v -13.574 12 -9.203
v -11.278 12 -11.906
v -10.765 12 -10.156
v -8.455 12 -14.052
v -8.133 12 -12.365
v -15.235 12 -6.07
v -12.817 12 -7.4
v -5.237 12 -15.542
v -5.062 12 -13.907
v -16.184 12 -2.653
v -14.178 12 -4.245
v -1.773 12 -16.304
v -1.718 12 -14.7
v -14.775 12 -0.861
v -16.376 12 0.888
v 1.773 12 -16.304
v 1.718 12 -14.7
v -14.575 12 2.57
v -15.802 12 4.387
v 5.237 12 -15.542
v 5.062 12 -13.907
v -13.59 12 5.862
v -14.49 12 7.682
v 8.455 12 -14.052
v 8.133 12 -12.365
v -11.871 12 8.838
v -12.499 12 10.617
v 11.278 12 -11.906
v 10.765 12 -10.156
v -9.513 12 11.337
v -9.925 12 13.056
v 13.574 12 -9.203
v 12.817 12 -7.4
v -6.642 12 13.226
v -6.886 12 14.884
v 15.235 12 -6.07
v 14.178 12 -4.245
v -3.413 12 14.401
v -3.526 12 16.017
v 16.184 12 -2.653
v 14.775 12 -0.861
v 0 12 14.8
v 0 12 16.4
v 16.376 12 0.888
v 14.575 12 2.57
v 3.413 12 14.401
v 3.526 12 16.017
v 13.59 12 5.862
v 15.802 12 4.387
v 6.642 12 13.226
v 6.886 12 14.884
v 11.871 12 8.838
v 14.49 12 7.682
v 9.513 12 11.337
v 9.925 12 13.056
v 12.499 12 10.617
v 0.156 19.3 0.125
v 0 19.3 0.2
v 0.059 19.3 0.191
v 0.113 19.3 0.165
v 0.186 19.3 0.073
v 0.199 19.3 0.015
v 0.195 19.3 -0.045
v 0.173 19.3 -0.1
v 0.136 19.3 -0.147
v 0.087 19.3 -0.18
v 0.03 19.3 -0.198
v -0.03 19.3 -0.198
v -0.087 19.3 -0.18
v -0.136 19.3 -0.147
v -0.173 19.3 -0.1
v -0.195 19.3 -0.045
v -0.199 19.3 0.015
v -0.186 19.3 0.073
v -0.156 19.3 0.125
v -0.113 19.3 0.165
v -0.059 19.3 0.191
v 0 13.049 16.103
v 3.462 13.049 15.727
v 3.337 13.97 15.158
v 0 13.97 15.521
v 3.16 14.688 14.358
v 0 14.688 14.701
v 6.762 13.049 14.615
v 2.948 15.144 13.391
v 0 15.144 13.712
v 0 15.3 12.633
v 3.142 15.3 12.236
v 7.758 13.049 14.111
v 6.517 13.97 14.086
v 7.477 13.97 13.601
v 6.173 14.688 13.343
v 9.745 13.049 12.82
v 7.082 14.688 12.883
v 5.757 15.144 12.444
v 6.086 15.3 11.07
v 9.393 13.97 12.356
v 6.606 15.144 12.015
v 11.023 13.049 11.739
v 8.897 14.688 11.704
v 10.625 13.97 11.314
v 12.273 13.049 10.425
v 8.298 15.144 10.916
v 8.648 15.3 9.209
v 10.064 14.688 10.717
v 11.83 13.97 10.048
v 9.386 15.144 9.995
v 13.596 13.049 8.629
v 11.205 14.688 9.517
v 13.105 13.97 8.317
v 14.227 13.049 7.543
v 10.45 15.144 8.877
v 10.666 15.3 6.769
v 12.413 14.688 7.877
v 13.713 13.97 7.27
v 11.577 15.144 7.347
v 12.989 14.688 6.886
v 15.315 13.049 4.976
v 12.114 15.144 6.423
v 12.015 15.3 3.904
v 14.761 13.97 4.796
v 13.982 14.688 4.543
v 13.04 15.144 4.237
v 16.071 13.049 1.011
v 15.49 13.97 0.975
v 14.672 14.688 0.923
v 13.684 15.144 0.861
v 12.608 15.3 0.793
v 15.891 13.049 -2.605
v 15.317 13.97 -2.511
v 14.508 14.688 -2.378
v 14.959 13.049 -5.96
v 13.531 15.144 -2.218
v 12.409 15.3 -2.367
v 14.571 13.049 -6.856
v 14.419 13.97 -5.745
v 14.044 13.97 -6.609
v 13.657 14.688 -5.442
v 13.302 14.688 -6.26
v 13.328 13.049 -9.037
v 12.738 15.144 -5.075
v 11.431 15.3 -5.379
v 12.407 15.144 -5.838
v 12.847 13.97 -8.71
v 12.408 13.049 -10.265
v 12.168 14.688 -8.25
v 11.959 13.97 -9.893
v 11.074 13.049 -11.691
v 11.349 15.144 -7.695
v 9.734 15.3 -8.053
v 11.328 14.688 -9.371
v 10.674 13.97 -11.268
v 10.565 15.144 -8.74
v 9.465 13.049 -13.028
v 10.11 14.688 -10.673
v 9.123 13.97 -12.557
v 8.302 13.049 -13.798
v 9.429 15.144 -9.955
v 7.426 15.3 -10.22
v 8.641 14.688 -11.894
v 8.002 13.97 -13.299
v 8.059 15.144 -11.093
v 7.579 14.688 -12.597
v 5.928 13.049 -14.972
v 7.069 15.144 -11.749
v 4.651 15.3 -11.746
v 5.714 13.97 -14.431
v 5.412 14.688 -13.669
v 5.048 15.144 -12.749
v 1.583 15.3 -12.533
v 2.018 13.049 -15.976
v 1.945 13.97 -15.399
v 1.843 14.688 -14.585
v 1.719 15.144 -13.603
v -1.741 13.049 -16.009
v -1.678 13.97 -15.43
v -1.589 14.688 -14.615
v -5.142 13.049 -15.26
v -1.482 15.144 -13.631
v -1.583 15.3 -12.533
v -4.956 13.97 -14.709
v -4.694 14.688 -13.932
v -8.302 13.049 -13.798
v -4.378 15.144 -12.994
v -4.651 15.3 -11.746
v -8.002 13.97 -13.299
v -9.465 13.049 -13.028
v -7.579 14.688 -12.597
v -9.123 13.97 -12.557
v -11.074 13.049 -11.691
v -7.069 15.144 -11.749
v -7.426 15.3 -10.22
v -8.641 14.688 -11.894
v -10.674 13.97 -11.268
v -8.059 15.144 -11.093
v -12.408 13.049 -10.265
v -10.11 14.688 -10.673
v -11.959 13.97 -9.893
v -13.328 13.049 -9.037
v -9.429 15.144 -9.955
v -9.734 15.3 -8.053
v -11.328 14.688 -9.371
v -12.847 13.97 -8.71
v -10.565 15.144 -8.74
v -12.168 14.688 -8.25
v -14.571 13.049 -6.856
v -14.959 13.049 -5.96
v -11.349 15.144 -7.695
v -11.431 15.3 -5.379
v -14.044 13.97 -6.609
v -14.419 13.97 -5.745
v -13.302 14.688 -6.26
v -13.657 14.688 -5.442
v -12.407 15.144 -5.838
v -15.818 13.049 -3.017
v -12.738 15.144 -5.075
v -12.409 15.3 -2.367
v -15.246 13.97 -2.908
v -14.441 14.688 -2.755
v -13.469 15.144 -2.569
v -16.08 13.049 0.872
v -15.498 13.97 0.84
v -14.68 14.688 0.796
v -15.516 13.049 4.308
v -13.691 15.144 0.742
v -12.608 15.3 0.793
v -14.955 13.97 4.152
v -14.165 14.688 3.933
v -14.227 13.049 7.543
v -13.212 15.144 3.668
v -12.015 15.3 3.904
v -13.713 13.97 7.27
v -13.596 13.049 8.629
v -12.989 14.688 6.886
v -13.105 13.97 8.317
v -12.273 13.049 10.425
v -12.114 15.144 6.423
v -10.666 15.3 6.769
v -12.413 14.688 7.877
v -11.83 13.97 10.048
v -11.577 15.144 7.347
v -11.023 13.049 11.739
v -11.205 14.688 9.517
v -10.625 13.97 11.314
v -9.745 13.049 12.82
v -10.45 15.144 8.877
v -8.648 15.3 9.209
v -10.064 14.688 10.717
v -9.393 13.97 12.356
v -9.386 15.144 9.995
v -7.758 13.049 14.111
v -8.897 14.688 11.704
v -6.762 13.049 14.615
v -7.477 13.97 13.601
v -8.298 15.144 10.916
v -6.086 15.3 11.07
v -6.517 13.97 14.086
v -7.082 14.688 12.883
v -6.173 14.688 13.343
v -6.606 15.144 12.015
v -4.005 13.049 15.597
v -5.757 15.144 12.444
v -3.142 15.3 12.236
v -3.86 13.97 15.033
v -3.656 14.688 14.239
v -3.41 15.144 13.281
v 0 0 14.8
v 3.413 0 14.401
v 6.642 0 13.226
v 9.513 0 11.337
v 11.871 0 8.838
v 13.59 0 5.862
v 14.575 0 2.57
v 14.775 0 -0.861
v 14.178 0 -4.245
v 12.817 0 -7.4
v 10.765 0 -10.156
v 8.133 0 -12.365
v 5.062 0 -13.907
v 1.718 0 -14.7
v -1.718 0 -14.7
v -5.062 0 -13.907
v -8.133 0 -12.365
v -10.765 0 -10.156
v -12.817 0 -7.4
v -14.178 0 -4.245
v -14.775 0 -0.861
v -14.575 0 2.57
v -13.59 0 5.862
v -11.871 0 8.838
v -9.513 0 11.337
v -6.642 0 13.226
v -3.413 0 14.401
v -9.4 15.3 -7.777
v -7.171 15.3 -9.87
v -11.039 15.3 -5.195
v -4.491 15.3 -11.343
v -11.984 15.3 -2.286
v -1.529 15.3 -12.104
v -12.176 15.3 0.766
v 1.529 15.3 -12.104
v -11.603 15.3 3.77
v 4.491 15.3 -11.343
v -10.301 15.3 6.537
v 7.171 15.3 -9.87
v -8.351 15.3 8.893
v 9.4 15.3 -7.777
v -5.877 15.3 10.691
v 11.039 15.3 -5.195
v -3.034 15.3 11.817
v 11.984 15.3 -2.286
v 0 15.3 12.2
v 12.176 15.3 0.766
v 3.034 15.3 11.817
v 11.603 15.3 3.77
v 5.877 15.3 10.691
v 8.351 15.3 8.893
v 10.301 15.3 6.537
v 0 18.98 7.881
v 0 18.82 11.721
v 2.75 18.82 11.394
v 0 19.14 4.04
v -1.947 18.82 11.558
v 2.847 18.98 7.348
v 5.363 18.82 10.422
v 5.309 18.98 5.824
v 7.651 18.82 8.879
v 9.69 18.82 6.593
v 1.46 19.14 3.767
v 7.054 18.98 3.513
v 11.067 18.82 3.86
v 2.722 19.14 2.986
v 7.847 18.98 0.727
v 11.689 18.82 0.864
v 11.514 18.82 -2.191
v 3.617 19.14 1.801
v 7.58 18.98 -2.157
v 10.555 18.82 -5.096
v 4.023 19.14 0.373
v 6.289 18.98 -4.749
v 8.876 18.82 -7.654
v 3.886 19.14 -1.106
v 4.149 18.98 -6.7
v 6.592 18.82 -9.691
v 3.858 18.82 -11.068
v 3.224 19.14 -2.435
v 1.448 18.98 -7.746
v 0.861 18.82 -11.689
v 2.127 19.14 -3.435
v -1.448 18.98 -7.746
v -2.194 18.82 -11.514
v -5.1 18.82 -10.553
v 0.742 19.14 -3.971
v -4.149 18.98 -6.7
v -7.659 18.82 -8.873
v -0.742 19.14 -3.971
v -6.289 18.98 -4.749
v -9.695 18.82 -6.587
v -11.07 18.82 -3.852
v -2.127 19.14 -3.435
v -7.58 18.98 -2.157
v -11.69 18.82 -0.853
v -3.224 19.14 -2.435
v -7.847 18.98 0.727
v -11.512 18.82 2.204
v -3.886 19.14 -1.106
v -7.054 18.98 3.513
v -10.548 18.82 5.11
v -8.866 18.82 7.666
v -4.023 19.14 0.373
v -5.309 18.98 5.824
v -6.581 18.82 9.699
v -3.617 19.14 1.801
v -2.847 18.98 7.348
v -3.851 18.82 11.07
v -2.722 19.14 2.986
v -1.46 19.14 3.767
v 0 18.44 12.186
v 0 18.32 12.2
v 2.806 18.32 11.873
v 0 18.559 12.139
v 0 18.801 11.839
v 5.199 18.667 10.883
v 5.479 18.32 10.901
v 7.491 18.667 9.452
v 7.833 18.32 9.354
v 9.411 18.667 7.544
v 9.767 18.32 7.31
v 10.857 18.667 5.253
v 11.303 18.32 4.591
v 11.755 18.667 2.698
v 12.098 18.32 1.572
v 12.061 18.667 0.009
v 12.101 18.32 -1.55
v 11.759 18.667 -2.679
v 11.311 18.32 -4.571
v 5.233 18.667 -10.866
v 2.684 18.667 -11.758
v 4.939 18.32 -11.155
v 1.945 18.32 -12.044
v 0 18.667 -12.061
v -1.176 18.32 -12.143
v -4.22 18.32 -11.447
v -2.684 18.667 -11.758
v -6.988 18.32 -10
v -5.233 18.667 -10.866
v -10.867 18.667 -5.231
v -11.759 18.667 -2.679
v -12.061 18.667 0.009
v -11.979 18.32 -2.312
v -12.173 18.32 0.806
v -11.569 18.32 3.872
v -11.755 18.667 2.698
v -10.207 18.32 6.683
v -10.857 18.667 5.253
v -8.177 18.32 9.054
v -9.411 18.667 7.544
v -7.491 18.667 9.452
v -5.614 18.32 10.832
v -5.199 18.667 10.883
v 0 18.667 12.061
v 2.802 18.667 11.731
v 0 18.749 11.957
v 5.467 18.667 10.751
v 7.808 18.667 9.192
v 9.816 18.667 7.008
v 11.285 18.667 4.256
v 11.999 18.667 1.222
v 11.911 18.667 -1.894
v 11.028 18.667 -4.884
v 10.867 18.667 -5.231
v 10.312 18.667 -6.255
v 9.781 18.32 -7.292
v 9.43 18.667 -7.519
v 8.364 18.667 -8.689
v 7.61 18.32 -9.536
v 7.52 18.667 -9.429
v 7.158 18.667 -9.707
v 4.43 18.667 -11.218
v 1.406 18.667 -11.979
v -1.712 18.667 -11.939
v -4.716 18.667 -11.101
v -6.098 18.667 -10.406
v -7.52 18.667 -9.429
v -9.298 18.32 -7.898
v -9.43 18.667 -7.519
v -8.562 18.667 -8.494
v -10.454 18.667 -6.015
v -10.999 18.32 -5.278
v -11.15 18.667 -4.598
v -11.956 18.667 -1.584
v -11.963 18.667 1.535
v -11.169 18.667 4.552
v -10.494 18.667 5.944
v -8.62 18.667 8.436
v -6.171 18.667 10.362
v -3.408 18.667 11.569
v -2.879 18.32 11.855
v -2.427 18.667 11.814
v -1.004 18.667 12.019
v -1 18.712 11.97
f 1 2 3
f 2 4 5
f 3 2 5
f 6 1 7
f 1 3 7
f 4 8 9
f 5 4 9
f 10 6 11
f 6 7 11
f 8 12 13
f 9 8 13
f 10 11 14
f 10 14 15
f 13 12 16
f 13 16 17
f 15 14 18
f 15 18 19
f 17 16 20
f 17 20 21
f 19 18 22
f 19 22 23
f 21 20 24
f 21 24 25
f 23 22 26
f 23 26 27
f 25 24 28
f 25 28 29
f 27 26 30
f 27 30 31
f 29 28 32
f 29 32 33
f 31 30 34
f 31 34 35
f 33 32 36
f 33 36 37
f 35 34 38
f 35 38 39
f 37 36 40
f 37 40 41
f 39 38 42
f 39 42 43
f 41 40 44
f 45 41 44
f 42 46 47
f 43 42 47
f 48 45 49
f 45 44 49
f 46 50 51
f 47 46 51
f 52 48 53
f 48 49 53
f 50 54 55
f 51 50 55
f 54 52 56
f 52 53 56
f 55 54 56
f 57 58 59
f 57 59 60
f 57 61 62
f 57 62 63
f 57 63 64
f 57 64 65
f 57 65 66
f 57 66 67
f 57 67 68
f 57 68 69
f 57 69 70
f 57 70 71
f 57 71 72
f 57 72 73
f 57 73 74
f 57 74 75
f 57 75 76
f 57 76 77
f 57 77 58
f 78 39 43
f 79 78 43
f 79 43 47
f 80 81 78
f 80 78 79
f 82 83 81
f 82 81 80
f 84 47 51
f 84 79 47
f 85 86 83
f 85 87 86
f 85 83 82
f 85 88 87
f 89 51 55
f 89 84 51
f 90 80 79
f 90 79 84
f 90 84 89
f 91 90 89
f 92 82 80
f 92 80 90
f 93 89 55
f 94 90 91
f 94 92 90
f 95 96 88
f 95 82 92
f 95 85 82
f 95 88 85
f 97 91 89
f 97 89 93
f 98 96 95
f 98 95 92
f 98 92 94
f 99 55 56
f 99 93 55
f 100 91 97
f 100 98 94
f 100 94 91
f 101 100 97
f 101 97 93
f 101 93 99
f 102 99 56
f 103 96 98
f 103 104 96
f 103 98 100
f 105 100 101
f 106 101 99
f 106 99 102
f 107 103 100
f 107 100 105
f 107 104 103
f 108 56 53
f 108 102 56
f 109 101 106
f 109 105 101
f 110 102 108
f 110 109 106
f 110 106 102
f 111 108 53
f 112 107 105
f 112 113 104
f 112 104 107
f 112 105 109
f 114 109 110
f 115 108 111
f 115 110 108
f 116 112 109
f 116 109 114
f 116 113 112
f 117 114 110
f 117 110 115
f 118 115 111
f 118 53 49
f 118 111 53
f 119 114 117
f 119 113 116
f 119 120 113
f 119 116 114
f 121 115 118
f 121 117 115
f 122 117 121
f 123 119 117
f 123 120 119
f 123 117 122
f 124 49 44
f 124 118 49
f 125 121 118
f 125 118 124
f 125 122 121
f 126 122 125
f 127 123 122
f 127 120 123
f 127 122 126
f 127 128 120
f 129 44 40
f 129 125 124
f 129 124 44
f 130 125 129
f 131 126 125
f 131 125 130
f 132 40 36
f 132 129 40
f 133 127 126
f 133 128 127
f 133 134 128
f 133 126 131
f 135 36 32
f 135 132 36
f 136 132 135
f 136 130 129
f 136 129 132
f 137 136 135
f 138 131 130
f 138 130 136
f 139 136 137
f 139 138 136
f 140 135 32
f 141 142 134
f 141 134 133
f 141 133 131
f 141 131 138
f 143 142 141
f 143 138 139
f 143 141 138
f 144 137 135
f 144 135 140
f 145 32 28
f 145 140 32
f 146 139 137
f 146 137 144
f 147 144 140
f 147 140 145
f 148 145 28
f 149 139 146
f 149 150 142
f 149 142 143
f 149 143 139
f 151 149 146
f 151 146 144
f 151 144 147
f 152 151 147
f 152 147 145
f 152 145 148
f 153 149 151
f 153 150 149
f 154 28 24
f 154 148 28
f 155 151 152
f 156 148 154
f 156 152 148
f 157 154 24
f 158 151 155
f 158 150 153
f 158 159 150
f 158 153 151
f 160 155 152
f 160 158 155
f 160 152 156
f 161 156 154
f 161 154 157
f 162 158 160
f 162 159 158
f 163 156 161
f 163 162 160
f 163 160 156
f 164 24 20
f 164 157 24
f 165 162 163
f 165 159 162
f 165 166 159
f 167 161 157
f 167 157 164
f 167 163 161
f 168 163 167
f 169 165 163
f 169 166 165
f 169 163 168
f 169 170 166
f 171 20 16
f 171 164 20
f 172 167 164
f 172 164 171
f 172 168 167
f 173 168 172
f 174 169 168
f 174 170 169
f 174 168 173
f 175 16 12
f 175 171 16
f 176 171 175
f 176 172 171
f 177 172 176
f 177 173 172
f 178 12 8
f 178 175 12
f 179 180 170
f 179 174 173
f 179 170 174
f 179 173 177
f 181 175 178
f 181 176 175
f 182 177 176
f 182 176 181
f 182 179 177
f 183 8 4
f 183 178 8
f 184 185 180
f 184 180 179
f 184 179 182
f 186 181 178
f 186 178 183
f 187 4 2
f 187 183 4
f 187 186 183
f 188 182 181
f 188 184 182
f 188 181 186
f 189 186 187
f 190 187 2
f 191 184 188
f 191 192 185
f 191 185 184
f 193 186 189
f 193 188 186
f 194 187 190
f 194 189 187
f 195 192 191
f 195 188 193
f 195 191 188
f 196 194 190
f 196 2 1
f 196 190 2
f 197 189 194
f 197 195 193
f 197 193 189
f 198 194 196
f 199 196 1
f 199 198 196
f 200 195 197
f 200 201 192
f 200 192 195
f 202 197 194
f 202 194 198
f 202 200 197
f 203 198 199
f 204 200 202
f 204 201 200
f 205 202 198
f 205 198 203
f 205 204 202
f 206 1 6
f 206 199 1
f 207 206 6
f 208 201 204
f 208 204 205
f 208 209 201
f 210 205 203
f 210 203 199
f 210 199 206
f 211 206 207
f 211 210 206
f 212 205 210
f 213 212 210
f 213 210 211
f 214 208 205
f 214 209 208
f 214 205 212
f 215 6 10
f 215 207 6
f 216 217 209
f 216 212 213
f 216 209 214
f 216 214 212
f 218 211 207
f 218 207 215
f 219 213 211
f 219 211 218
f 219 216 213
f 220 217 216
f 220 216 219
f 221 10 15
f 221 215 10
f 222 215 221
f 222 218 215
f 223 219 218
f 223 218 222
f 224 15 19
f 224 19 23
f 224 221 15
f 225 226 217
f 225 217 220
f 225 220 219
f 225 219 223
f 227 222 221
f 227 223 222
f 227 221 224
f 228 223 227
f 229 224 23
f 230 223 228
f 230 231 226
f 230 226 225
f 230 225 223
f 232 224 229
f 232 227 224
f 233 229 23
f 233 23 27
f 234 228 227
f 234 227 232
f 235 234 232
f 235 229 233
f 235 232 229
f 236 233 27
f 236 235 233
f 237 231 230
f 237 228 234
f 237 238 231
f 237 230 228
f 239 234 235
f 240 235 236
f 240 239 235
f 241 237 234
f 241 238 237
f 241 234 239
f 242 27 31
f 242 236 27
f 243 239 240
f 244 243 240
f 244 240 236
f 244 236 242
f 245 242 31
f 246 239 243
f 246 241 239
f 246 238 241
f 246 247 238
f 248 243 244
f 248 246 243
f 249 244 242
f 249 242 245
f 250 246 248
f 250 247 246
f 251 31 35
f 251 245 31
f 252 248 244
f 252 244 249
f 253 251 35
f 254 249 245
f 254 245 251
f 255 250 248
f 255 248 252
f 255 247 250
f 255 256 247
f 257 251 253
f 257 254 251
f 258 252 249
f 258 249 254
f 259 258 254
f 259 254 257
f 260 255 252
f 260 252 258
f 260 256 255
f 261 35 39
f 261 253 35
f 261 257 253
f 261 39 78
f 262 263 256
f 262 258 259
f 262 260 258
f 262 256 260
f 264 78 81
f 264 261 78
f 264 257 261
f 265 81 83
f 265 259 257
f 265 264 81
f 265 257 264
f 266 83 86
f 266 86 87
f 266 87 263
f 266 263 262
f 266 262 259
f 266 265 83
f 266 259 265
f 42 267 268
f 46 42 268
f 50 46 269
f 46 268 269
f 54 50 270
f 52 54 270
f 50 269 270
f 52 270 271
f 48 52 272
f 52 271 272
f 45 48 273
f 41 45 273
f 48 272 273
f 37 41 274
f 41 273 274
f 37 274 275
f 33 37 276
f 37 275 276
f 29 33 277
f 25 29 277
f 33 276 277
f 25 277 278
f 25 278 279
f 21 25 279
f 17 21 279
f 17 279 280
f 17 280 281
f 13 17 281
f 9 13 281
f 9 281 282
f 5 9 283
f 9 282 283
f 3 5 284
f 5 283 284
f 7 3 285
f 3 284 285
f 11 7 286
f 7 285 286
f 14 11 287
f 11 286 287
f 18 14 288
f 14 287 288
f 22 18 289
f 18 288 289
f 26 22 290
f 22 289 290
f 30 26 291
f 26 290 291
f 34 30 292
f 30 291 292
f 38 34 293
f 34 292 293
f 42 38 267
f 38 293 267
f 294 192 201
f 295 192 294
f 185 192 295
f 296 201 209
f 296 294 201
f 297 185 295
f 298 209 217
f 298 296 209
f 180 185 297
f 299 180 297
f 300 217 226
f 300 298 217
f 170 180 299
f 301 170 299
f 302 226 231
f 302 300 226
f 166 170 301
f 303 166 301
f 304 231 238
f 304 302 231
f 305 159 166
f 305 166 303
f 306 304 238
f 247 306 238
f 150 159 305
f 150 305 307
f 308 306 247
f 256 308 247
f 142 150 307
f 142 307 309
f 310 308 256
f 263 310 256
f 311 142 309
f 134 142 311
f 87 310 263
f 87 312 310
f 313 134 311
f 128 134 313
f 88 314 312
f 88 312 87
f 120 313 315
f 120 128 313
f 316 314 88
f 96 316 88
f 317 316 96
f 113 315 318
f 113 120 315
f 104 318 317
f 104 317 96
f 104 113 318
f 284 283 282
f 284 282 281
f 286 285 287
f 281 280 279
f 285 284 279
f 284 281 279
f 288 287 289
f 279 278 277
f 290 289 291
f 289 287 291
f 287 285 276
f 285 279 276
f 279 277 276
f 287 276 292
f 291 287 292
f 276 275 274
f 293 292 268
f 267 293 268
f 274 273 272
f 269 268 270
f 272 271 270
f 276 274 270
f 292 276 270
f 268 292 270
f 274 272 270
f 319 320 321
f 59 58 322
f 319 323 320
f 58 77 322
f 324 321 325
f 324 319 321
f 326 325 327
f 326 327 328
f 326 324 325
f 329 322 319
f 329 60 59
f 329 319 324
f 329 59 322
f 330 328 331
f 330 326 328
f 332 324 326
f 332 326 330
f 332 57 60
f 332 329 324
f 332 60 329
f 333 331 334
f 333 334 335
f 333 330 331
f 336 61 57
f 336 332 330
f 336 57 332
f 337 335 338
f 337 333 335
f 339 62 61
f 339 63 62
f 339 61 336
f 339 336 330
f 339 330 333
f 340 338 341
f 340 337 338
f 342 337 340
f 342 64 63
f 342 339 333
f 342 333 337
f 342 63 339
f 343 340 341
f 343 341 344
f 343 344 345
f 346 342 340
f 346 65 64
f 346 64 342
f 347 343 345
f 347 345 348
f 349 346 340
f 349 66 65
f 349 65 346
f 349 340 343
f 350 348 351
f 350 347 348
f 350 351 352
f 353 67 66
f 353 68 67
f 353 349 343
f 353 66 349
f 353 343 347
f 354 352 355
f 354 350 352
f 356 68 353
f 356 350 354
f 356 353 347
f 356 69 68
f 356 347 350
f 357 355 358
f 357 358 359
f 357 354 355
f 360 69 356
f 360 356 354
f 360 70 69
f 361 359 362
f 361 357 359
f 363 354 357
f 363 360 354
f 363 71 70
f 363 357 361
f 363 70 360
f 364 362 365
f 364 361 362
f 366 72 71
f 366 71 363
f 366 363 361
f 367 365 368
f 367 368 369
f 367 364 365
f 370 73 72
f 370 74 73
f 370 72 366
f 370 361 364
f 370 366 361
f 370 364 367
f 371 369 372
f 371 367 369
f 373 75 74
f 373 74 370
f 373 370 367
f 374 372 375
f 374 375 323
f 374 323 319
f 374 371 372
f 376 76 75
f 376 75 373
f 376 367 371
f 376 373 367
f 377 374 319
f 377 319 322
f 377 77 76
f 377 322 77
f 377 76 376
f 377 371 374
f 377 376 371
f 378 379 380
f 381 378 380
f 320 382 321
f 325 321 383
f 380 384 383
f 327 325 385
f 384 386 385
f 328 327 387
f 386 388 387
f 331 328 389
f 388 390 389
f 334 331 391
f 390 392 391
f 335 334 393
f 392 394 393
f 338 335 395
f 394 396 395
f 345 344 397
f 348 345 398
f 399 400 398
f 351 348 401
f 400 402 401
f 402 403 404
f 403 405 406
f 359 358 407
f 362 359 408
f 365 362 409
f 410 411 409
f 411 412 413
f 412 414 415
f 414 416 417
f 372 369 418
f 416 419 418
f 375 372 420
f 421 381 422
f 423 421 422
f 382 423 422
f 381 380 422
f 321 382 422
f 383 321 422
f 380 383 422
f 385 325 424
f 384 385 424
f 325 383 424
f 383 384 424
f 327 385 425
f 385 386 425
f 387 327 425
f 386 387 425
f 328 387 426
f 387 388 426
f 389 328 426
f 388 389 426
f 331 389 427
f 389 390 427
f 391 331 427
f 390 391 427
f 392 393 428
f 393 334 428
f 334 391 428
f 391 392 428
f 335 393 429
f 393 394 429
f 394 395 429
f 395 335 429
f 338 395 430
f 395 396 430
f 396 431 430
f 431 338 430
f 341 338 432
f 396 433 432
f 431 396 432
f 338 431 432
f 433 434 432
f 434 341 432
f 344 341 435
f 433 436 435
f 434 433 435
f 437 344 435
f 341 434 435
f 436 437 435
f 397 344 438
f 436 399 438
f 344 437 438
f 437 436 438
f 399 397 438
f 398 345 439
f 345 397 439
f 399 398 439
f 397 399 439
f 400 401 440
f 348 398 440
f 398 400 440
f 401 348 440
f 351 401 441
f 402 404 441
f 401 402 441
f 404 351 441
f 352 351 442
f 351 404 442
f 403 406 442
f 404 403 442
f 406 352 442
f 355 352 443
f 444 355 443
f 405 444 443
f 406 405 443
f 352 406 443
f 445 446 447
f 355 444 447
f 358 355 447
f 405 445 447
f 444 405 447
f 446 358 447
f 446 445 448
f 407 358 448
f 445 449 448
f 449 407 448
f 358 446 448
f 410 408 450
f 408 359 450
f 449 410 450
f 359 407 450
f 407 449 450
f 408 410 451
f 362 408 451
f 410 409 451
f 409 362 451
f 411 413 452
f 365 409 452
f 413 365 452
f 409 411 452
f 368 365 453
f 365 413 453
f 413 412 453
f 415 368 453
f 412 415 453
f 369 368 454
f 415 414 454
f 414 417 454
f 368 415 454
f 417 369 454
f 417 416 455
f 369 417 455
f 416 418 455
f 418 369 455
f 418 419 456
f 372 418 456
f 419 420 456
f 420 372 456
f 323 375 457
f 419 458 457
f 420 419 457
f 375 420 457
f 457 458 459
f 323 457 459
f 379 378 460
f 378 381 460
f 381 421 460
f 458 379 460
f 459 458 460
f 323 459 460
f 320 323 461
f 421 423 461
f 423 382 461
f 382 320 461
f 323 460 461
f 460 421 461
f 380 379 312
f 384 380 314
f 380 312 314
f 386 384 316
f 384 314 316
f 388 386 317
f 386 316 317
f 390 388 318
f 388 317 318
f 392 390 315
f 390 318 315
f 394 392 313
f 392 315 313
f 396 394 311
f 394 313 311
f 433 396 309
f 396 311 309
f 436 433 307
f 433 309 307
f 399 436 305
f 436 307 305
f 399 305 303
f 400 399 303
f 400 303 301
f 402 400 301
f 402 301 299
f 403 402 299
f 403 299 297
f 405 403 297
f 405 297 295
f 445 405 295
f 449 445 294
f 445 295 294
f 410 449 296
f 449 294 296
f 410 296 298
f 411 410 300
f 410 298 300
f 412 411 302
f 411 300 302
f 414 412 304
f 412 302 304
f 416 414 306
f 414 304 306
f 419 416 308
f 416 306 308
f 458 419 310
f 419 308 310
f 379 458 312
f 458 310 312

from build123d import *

# Parameters (mm, degrees)
SKETCH1_R           = 14.8
BOSS_EXTRUDE1_DEPTH = 12
SKETCH2_R           = 16.4
BOSS_EXTRUDE2_DEPTH = 3.3
FILLET1_R           = 3.8
SKETCH3_R           = 12.2
BOSS_EXTRUDE3_DEPTH = 4
CHAMFER1_SIZE       = 0.5
CHAMFER1_SIZE2      = 12
FILLET2_R           = 0.5


with BuildPart() as part:
    # Sketch1 → Boss-Extrude1 (new body)
    with BuildSketch(Plane(origin=(0, 0, 0), x_dir=(1, 0, 0), z_dir=(0, 1, 0))):
        with Locations(Location((0, 0, 0), (0, 0, 270))):
            Circle(SKETCH1_R)
    extrude(amount=BOSS_EXTRUDE1_DEPTH)

    # Sketch2 → Boss-Extrude2 (add)
    with BuildSketch(Plane(origin=(0, 12, 0), x_dir=(1, 0, 0), z_dir=(0, 1, 0))):
        with Locations(Location((0, 0, 0), (0, 0, 270))):
            Circle(SKETCH2_R)
    extrude(amount=BOSS_EXTRUDE2_DEPTH)

    # Fillet1
    # the kernel refuses this fillet: 3.8 mm, written as the material it takes off along each edge
    with BuildSketch(Plane(origin=(0, 15.3, 0), x_dir=(0, 0, 1), z_dir=(-1, 0, 0))) as fillet1_piece_1:
        with BuildLine():
            CenterArc((12.63303836, -3.8), FILLET1_R, 7.560843177, 82.439156823)
            Line((12.63303836, 0), (12.63303836, 0.076))
            Line((12.63303836, 0.076), (16.4, 0.076))
            Line((16.4, 0.076), (16.476, 0))
            ThreePointArc((16.476, 0), (16.476, -1.65), (16.475339233, -3.29))
            Line((16.475339233, -3.29), (16.4, -3.3))
        make_face()
    revolve(axis=Axis((0, 15.3, 0), (0, 1, 0)), mode=Mode.SUBTRACT)

    # Sketch3 → Boss-Extrude3 (add)
    with BuildSketch(Plane(origin=(0, 15.3, 0), x_dir=(1, 0, 0), z_dir=(0, 1, 0))):
        with Locations(Location((0, 0, 0), (0, 0, 270))):
            Circle(SKETCH3_R)
    extrude(amount=BOSS_EXTRUDE3_DEPTH)

    # Chamfer1
    chamfer1_edges = [part.edges().sort_by_distance(p)[0] for p in [
        (0, 19.3, -12.2),
    ]]
    chamfer1_side = [part.faces().sort_by_distance(p)[0] for p in [
        (0, 17.3, -12.2),
    ]]
    chamfer(chamfer1_edges, length=CHAMFER1_SIZE, length2=CHAMFER1_SIZE2, reference=chamfer1_side[0])

    # Fillet2
    fillet2_edges = [part.edges().sort_by_distance(p)[0] for p in [
        (0, 18.8, -12.2),
    ]]
    fillet(fillet2_edges, radius=FILLET2_R)


solid = part.part
